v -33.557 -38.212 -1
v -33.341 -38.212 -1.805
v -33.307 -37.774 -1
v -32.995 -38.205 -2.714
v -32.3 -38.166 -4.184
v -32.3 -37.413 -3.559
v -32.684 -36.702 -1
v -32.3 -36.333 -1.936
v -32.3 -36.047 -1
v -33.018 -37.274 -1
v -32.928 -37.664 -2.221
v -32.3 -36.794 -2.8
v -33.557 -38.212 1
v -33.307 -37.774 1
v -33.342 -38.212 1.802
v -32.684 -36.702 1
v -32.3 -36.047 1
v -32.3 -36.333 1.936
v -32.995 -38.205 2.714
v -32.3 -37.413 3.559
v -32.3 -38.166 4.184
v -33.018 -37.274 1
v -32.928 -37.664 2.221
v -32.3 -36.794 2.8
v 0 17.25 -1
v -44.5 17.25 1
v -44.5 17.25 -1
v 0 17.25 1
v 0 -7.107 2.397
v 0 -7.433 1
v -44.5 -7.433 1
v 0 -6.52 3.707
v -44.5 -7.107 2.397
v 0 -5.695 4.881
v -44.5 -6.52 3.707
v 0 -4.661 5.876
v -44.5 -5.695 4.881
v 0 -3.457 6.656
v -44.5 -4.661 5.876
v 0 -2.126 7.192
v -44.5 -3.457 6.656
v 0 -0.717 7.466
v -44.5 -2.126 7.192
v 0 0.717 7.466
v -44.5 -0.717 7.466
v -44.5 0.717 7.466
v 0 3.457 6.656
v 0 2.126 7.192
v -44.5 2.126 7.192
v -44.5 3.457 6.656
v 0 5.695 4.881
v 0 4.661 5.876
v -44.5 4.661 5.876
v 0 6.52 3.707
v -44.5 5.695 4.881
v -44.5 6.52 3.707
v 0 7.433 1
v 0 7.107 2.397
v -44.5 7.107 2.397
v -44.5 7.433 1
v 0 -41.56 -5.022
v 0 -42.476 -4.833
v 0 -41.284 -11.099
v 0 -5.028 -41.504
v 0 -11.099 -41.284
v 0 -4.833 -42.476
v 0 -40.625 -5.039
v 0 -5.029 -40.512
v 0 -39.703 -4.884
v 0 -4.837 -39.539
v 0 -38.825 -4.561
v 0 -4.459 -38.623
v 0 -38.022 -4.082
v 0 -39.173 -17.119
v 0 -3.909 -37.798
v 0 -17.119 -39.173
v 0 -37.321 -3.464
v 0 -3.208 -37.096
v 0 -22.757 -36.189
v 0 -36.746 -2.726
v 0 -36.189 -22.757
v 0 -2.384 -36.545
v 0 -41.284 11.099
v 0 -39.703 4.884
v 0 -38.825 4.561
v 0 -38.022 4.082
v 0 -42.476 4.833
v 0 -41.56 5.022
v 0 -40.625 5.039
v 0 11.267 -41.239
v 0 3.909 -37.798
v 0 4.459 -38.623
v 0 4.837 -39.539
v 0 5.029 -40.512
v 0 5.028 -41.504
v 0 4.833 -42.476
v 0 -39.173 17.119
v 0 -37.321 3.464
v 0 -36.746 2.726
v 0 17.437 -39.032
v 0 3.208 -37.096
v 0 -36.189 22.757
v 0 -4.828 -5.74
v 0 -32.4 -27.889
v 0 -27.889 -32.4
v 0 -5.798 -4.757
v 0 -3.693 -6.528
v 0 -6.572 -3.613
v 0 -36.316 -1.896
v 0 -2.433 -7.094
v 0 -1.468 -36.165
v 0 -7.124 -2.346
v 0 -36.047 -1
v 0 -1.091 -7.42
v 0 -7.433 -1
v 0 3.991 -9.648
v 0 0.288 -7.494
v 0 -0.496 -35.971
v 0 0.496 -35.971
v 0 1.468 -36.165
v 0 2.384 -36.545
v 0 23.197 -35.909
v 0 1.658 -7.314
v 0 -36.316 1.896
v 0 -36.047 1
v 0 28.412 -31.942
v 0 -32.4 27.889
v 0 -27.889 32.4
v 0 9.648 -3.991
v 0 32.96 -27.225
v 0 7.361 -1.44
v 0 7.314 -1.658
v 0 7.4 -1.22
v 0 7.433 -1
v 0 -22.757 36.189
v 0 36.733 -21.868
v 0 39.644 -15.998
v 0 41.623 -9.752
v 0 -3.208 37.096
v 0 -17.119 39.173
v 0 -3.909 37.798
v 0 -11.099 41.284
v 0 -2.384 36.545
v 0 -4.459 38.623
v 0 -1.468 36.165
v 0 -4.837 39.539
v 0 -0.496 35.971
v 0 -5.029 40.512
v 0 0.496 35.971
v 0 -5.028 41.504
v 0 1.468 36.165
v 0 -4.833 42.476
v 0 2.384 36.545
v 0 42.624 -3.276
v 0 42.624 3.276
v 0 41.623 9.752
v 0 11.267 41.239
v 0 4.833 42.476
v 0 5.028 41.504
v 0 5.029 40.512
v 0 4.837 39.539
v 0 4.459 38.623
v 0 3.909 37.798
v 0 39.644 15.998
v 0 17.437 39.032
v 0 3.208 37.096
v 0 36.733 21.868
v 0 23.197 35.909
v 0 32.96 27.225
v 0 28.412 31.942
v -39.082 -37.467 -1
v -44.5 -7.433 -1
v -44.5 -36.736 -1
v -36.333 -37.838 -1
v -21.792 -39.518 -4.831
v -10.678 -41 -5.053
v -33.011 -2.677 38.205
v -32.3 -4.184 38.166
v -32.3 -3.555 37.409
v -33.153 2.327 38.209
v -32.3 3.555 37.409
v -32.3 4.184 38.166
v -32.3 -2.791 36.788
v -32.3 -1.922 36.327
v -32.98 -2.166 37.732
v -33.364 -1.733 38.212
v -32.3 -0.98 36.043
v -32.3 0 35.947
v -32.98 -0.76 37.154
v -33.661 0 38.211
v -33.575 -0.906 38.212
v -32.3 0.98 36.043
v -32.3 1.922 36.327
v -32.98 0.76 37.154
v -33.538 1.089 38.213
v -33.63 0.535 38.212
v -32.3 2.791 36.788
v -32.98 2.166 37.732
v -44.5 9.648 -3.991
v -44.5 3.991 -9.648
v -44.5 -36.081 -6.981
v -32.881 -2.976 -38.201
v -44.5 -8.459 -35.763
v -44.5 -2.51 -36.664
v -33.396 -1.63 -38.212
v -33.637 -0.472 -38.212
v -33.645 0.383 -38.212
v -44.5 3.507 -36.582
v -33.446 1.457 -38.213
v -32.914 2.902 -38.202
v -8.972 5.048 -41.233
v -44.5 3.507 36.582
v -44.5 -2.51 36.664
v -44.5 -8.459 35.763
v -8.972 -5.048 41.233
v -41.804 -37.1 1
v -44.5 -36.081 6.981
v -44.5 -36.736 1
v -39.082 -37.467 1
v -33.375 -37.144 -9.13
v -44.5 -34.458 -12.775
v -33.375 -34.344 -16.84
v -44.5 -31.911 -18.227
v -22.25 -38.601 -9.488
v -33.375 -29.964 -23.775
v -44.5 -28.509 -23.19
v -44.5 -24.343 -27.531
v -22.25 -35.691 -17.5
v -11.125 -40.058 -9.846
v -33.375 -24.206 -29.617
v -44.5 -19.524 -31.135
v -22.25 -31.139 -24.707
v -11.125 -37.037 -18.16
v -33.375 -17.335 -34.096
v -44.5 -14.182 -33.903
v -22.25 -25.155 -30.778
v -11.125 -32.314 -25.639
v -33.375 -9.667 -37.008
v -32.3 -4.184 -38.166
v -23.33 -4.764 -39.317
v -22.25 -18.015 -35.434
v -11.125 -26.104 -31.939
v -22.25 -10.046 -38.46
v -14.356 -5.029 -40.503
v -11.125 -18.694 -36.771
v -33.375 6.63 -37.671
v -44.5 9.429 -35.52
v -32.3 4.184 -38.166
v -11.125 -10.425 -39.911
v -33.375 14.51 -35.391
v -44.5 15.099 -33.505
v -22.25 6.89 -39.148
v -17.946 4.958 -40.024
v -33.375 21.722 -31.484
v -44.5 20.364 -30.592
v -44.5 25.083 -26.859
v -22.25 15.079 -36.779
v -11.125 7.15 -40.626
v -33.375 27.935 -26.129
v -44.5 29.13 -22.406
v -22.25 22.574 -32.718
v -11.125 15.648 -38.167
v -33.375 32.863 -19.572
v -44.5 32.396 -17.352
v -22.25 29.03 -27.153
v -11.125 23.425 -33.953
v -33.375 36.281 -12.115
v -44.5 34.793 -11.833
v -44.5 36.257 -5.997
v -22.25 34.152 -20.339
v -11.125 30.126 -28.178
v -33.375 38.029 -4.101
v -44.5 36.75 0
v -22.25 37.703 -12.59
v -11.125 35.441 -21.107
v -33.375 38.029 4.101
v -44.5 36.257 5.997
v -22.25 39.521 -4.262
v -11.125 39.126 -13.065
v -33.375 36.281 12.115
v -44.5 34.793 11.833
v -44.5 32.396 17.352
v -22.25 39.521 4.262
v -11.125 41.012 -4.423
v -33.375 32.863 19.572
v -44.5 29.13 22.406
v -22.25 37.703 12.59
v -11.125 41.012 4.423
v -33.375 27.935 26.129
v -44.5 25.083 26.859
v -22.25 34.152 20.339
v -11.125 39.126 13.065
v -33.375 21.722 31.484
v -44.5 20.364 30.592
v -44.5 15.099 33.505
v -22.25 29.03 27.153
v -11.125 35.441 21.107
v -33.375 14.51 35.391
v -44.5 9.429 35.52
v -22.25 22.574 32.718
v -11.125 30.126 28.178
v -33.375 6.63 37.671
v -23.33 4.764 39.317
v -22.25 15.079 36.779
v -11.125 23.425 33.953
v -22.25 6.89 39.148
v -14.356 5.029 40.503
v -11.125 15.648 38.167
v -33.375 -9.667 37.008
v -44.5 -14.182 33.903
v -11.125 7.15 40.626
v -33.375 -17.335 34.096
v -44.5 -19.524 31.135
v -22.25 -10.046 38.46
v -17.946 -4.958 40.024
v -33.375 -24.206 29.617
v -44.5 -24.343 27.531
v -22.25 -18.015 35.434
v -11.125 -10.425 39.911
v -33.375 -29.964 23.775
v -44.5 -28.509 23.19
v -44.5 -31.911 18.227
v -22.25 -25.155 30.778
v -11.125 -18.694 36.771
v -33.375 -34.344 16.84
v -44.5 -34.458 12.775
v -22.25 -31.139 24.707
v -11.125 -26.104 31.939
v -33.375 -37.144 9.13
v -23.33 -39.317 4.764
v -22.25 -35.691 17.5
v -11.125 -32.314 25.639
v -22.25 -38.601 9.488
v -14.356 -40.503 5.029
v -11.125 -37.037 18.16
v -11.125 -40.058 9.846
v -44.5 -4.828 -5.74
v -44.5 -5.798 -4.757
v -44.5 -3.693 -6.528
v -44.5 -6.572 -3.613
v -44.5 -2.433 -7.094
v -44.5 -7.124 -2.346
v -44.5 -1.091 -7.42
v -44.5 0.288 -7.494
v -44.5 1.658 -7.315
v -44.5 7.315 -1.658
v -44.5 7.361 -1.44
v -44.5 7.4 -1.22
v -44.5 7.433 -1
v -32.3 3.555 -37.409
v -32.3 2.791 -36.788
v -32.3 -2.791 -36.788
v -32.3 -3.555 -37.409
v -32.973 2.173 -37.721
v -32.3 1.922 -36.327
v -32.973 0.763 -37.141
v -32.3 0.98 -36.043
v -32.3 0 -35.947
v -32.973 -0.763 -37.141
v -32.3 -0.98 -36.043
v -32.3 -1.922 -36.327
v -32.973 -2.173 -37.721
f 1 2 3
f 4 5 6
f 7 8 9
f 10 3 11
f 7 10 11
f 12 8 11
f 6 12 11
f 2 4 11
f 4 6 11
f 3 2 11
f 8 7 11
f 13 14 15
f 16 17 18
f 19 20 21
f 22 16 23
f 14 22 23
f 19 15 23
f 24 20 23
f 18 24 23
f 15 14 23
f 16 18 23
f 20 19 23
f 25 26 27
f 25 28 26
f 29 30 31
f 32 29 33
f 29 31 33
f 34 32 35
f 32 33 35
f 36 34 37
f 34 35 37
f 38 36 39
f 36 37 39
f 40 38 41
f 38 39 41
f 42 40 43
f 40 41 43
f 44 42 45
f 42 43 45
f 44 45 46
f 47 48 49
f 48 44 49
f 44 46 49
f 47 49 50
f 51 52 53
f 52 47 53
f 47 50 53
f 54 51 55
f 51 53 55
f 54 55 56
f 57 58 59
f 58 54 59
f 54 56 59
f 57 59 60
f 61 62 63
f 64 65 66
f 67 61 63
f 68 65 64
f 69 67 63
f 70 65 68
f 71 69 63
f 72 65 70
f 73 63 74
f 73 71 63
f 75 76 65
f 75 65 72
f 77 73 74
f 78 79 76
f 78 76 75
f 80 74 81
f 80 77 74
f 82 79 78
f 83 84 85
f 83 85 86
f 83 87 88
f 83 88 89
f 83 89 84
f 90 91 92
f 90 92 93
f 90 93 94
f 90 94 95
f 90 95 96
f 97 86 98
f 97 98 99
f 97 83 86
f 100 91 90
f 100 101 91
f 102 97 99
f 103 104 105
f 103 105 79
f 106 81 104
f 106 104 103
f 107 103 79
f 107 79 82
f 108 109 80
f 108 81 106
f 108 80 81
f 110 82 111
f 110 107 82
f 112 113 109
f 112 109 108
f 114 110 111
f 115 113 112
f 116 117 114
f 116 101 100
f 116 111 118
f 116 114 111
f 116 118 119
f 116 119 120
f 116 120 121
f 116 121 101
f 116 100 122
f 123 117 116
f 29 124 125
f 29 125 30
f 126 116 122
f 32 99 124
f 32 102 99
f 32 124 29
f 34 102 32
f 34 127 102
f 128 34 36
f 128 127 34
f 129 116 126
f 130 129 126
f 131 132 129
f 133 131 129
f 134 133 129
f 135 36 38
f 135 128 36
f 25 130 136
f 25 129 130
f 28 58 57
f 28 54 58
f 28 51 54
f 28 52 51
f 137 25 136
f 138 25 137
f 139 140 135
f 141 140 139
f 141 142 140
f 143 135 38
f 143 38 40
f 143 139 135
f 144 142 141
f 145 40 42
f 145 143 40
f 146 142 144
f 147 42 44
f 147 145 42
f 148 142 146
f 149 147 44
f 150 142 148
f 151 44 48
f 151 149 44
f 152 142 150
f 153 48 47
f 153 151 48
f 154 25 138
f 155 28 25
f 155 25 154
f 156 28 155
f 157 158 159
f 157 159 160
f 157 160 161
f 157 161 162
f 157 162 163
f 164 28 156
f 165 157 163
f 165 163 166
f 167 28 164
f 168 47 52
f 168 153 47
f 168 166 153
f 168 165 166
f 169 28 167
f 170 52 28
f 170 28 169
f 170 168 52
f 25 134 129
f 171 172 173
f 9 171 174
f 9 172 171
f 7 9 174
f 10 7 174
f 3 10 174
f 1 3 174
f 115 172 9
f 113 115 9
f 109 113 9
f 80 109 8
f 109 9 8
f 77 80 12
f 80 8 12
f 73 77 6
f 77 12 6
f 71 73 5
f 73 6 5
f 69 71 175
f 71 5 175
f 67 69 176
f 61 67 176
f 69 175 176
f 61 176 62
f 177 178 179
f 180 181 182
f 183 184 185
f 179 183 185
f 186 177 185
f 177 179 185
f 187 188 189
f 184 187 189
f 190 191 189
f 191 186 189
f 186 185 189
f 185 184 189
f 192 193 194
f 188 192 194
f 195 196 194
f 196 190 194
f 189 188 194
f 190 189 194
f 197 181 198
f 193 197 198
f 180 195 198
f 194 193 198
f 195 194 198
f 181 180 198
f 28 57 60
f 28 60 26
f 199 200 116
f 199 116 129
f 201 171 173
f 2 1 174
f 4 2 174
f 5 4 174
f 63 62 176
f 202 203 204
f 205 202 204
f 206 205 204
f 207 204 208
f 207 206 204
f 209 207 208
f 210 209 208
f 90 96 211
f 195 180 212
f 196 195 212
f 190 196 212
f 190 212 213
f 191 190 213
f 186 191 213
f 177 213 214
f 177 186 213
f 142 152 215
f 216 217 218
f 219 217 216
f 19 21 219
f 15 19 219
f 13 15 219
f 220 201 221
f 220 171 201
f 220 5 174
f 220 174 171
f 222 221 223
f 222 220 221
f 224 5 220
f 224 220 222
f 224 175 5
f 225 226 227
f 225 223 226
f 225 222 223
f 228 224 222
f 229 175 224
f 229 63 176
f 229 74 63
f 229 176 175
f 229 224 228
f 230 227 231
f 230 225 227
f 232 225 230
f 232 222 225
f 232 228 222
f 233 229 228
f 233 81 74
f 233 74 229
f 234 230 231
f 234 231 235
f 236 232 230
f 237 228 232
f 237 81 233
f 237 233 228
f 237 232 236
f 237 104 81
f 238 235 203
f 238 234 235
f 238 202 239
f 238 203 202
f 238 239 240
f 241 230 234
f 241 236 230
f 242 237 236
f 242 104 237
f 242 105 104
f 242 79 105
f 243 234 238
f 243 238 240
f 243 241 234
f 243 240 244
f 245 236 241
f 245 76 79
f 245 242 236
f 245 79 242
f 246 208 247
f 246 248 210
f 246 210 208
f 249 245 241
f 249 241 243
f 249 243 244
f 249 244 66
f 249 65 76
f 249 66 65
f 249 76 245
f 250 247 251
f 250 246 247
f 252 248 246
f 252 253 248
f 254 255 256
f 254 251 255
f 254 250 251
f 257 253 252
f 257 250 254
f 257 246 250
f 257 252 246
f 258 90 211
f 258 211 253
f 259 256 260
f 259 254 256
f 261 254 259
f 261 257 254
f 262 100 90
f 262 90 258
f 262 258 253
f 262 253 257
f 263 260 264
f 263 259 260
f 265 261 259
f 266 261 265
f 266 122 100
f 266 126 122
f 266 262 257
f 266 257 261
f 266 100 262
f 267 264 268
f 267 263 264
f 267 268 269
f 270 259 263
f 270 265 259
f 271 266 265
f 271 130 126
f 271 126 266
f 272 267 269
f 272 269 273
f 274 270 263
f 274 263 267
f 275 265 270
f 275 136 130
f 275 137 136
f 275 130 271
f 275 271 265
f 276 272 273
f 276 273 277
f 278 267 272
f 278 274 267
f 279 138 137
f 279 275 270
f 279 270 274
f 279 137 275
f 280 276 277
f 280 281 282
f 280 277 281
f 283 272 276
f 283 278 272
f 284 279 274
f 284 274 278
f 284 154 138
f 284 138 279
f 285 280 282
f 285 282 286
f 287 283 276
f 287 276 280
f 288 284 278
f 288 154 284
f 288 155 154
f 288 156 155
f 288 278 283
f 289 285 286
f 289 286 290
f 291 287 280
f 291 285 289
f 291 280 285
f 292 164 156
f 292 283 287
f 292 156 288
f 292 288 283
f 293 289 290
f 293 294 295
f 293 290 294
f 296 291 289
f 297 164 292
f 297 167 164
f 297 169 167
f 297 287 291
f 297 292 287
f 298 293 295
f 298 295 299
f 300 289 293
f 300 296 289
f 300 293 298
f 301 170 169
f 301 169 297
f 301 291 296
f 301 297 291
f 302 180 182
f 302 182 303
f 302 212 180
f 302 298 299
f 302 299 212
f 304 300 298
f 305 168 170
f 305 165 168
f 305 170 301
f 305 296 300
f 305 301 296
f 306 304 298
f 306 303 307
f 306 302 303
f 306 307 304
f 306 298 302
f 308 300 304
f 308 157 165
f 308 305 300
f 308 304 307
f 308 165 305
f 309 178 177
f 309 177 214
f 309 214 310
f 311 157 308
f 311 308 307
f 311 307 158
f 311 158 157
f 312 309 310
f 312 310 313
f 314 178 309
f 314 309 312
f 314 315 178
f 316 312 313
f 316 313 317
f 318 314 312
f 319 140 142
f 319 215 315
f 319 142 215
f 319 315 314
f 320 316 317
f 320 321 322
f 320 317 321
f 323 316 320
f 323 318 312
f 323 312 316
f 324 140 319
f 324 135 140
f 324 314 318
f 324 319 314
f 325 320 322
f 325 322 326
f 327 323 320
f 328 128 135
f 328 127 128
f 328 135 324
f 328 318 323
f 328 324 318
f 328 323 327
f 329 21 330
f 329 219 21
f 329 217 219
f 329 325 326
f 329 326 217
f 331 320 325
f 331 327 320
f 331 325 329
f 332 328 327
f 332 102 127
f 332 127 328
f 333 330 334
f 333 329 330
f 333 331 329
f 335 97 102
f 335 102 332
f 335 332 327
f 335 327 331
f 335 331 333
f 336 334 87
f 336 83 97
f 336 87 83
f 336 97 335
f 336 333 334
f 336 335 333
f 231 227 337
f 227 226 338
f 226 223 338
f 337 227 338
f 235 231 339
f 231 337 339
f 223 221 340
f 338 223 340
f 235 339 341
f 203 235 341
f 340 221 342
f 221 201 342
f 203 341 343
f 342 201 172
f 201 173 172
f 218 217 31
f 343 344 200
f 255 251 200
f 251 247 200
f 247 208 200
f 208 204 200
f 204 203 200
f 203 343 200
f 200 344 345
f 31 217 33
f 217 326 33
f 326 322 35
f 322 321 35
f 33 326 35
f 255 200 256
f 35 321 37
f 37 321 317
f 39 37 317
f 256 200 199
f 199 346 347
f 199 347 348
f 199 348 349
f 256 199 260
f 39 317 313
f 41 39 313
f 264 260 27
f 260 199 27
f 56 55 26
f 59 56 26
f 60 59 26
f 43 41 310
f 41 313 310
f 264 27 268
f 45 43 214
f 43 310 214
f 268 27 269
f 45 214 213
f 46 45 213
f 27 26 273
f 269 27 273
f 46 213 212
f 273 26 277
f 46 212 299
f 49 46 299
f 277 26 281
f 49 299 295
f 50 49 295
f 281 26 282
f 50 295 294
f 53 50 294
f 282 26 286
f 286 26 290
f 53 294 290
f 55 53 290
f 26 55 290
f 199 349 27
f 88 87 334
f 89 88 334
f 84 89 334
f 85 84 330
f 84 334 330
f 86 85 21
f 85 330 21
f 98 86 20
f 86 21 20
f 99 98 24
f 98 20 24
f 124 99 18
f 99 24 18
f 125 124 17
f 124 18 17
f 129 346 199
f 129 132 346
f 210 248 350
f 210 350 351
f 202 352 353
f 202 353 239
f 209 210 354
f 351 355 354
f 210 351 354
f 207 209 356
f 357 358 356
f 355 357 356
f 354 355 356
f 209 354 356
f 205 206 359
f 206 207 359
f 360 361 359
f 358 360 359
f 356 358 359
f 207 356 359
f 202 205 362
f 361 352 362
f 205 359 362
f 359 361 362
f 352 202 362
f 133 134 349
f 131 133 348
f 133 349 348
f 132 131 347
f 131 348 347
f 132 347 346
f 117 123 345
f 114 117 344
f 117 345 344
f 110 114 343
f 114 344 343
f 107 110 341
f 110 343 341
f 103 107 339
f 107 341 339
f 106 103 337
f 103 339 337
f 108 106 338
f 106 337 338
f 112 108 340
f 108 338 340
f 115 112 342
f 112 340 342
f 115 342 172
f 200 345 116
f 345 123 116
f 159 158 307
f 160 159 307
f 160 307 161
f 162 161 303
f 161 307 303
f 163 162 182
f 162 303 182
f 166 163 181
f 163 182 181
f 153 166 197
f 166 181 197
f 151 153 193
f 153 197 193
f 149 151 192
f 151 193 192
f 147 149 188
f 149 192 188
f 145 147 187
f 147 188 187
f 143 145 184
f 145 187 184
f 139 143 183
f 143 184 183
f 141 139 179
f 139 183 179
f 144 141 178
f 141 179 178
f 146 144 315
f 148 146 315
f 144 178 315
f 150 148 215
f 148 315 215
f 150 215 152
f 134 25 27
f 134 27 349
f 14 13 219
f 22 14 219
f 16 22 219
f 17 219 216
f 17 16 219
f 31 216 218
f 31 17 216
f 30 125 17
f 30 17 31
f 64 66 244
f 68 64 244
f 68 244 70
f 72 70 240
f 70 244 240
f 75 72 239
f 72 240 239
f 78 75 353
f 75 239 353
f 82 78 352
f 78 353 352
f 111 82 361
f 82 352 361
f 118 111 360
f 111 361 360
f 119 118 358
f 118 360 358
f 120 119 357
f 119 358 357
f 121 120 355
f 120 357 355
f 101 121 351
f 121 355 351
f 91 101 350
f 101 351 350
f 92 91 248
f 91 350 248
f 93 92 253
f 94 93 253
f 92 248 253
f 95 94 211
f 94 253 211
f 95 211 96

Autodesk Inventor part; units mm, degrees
ref_plane "YZ Plane" through (0, 0, 0) normal (1, 0, 0) x (0, 1, 0)
ref_plane "XZ Plane" through (0, 0, 0) normal (0, 1, 0) x (-1, 0, 0)
ref_plane "XY Plane" through (0, 0, 0) normal (0, 0, 1) x (1, 0, 0)
sketch "Esquisse1" plane through (0, 0, 0) normal (0, 0, 1) x (1, 0, 0)
  line L0 (-36.1898, 0) -> (37.2521, 0)
  line L1 (0, 7.5) -> (-44.5, 7.5)
  line L2 (-44.5, 7.5) -> (-44.5, 36.75)
  line L3 (-44.5, 36.75) -> (0, 42.75)
  line L4 (0, 42.75) -> (0, 7.5)
  point P0 (0, 0)
  dimension "d0" = 15
  dimension "d1" = 85.5
  dimension "d2" = 0
  dimension "d3" = 73.5
  dimension "d4" = 44.5
  dimension "d5" = 0
revolve "Révolution1" add sketch "Esquisse1" angle 360 about axis through (-36.1898, 0, 0) along (1, 0, 0)
sketch "Esquisse3" plane through (0, 0, 0) normal (1, 0, 0) x (0, 0, -1)
  circle A0 centre (0, 0) radius 41
  circle A1 centre (0, 0) radius 7.5 projected
  line L0 (0, 0) -> (-59.2945, 0)
  line L1 (0, 0) -> (0, -53.2291)
  line L2 (0, 0) -> (55.0659, 0)
  point P0 (0, -41)
  point P1 (41, 0)
  point P2 (-41, 0)
  dimension "d16" = 82
hole "Perçage1" at (0, -41, 0) at (0, 0, 41) at (0, 0, -41) direction (-1, 0, 0) diameter 10.106 depth 32.3 tip angle 118 thread size "M12x1.75" class "6H" standard "ANSI Metric M Profile"
sketch "Esquisse4" plane through (0, 0, 0) normal (1, 0, 0) x (0, 0, 1)
  line L0 (0, 0) -> (-39.036, -39.036)
  line L1 (0, 0) -> (-55.3193, 0)
  circle A0 centre (0, 0) radius 7.5 projected
  line L2 (-1.6577, -7.3145) -> (-3.9911, -9.648)
  line L3 (-7.3145, -1.6577) -> (-9.648, -3.9911)
  line L4 (-9.648, -3.9911) -> (-3.9911, -9.648)
  dimension "d17" = 45
  dimension "d20" = 3.3
  dimension "d21" = 3.3
  dimension "d22" = 4
  dimension "d23" = 4
extrude "Extrusion1" cut sketch "Esquisse4" against normal through all contours A0 L2 L4 L0 | L0 L4 L3 A0
sketch "Esquisse5" plane through (0, 0, 0) normal (1, 0, 0) x (0, 0, 1)
  line L0 (-1, 42.75) -> (1, 42.75)
  line L1 (1, 42.75) -> (1, -17.25)
  line L2 (1, -17.25) -> (-1, -17.25)
  line L3 (-1, -17.25) -> (-1, 42.75)
  line L4 (-1, 42.75) -> (1, -17.25) construction
  line L5 (1, 42.75) -> (-1, -17.25) construction
  arc A0 (-4.8326, 42.476) -> (4.8326, 42.476) centre (0, 0) ccw projected
  point P0 (0, 12.75)
  point P1 (42.6948, 2.1722)
  point P2 (-42.6948, 2.1722)
  point P3 (4.9266, -42.4652)
  point P4 (42.5102, -4.5219)
  dimension "d26" = 2
  dimension "d27" = 60
  dimension "d28" = 0
extrude "Extrusion2" cut sketch "Esquisse5" against normal through all
properties part number "Douille2517"
